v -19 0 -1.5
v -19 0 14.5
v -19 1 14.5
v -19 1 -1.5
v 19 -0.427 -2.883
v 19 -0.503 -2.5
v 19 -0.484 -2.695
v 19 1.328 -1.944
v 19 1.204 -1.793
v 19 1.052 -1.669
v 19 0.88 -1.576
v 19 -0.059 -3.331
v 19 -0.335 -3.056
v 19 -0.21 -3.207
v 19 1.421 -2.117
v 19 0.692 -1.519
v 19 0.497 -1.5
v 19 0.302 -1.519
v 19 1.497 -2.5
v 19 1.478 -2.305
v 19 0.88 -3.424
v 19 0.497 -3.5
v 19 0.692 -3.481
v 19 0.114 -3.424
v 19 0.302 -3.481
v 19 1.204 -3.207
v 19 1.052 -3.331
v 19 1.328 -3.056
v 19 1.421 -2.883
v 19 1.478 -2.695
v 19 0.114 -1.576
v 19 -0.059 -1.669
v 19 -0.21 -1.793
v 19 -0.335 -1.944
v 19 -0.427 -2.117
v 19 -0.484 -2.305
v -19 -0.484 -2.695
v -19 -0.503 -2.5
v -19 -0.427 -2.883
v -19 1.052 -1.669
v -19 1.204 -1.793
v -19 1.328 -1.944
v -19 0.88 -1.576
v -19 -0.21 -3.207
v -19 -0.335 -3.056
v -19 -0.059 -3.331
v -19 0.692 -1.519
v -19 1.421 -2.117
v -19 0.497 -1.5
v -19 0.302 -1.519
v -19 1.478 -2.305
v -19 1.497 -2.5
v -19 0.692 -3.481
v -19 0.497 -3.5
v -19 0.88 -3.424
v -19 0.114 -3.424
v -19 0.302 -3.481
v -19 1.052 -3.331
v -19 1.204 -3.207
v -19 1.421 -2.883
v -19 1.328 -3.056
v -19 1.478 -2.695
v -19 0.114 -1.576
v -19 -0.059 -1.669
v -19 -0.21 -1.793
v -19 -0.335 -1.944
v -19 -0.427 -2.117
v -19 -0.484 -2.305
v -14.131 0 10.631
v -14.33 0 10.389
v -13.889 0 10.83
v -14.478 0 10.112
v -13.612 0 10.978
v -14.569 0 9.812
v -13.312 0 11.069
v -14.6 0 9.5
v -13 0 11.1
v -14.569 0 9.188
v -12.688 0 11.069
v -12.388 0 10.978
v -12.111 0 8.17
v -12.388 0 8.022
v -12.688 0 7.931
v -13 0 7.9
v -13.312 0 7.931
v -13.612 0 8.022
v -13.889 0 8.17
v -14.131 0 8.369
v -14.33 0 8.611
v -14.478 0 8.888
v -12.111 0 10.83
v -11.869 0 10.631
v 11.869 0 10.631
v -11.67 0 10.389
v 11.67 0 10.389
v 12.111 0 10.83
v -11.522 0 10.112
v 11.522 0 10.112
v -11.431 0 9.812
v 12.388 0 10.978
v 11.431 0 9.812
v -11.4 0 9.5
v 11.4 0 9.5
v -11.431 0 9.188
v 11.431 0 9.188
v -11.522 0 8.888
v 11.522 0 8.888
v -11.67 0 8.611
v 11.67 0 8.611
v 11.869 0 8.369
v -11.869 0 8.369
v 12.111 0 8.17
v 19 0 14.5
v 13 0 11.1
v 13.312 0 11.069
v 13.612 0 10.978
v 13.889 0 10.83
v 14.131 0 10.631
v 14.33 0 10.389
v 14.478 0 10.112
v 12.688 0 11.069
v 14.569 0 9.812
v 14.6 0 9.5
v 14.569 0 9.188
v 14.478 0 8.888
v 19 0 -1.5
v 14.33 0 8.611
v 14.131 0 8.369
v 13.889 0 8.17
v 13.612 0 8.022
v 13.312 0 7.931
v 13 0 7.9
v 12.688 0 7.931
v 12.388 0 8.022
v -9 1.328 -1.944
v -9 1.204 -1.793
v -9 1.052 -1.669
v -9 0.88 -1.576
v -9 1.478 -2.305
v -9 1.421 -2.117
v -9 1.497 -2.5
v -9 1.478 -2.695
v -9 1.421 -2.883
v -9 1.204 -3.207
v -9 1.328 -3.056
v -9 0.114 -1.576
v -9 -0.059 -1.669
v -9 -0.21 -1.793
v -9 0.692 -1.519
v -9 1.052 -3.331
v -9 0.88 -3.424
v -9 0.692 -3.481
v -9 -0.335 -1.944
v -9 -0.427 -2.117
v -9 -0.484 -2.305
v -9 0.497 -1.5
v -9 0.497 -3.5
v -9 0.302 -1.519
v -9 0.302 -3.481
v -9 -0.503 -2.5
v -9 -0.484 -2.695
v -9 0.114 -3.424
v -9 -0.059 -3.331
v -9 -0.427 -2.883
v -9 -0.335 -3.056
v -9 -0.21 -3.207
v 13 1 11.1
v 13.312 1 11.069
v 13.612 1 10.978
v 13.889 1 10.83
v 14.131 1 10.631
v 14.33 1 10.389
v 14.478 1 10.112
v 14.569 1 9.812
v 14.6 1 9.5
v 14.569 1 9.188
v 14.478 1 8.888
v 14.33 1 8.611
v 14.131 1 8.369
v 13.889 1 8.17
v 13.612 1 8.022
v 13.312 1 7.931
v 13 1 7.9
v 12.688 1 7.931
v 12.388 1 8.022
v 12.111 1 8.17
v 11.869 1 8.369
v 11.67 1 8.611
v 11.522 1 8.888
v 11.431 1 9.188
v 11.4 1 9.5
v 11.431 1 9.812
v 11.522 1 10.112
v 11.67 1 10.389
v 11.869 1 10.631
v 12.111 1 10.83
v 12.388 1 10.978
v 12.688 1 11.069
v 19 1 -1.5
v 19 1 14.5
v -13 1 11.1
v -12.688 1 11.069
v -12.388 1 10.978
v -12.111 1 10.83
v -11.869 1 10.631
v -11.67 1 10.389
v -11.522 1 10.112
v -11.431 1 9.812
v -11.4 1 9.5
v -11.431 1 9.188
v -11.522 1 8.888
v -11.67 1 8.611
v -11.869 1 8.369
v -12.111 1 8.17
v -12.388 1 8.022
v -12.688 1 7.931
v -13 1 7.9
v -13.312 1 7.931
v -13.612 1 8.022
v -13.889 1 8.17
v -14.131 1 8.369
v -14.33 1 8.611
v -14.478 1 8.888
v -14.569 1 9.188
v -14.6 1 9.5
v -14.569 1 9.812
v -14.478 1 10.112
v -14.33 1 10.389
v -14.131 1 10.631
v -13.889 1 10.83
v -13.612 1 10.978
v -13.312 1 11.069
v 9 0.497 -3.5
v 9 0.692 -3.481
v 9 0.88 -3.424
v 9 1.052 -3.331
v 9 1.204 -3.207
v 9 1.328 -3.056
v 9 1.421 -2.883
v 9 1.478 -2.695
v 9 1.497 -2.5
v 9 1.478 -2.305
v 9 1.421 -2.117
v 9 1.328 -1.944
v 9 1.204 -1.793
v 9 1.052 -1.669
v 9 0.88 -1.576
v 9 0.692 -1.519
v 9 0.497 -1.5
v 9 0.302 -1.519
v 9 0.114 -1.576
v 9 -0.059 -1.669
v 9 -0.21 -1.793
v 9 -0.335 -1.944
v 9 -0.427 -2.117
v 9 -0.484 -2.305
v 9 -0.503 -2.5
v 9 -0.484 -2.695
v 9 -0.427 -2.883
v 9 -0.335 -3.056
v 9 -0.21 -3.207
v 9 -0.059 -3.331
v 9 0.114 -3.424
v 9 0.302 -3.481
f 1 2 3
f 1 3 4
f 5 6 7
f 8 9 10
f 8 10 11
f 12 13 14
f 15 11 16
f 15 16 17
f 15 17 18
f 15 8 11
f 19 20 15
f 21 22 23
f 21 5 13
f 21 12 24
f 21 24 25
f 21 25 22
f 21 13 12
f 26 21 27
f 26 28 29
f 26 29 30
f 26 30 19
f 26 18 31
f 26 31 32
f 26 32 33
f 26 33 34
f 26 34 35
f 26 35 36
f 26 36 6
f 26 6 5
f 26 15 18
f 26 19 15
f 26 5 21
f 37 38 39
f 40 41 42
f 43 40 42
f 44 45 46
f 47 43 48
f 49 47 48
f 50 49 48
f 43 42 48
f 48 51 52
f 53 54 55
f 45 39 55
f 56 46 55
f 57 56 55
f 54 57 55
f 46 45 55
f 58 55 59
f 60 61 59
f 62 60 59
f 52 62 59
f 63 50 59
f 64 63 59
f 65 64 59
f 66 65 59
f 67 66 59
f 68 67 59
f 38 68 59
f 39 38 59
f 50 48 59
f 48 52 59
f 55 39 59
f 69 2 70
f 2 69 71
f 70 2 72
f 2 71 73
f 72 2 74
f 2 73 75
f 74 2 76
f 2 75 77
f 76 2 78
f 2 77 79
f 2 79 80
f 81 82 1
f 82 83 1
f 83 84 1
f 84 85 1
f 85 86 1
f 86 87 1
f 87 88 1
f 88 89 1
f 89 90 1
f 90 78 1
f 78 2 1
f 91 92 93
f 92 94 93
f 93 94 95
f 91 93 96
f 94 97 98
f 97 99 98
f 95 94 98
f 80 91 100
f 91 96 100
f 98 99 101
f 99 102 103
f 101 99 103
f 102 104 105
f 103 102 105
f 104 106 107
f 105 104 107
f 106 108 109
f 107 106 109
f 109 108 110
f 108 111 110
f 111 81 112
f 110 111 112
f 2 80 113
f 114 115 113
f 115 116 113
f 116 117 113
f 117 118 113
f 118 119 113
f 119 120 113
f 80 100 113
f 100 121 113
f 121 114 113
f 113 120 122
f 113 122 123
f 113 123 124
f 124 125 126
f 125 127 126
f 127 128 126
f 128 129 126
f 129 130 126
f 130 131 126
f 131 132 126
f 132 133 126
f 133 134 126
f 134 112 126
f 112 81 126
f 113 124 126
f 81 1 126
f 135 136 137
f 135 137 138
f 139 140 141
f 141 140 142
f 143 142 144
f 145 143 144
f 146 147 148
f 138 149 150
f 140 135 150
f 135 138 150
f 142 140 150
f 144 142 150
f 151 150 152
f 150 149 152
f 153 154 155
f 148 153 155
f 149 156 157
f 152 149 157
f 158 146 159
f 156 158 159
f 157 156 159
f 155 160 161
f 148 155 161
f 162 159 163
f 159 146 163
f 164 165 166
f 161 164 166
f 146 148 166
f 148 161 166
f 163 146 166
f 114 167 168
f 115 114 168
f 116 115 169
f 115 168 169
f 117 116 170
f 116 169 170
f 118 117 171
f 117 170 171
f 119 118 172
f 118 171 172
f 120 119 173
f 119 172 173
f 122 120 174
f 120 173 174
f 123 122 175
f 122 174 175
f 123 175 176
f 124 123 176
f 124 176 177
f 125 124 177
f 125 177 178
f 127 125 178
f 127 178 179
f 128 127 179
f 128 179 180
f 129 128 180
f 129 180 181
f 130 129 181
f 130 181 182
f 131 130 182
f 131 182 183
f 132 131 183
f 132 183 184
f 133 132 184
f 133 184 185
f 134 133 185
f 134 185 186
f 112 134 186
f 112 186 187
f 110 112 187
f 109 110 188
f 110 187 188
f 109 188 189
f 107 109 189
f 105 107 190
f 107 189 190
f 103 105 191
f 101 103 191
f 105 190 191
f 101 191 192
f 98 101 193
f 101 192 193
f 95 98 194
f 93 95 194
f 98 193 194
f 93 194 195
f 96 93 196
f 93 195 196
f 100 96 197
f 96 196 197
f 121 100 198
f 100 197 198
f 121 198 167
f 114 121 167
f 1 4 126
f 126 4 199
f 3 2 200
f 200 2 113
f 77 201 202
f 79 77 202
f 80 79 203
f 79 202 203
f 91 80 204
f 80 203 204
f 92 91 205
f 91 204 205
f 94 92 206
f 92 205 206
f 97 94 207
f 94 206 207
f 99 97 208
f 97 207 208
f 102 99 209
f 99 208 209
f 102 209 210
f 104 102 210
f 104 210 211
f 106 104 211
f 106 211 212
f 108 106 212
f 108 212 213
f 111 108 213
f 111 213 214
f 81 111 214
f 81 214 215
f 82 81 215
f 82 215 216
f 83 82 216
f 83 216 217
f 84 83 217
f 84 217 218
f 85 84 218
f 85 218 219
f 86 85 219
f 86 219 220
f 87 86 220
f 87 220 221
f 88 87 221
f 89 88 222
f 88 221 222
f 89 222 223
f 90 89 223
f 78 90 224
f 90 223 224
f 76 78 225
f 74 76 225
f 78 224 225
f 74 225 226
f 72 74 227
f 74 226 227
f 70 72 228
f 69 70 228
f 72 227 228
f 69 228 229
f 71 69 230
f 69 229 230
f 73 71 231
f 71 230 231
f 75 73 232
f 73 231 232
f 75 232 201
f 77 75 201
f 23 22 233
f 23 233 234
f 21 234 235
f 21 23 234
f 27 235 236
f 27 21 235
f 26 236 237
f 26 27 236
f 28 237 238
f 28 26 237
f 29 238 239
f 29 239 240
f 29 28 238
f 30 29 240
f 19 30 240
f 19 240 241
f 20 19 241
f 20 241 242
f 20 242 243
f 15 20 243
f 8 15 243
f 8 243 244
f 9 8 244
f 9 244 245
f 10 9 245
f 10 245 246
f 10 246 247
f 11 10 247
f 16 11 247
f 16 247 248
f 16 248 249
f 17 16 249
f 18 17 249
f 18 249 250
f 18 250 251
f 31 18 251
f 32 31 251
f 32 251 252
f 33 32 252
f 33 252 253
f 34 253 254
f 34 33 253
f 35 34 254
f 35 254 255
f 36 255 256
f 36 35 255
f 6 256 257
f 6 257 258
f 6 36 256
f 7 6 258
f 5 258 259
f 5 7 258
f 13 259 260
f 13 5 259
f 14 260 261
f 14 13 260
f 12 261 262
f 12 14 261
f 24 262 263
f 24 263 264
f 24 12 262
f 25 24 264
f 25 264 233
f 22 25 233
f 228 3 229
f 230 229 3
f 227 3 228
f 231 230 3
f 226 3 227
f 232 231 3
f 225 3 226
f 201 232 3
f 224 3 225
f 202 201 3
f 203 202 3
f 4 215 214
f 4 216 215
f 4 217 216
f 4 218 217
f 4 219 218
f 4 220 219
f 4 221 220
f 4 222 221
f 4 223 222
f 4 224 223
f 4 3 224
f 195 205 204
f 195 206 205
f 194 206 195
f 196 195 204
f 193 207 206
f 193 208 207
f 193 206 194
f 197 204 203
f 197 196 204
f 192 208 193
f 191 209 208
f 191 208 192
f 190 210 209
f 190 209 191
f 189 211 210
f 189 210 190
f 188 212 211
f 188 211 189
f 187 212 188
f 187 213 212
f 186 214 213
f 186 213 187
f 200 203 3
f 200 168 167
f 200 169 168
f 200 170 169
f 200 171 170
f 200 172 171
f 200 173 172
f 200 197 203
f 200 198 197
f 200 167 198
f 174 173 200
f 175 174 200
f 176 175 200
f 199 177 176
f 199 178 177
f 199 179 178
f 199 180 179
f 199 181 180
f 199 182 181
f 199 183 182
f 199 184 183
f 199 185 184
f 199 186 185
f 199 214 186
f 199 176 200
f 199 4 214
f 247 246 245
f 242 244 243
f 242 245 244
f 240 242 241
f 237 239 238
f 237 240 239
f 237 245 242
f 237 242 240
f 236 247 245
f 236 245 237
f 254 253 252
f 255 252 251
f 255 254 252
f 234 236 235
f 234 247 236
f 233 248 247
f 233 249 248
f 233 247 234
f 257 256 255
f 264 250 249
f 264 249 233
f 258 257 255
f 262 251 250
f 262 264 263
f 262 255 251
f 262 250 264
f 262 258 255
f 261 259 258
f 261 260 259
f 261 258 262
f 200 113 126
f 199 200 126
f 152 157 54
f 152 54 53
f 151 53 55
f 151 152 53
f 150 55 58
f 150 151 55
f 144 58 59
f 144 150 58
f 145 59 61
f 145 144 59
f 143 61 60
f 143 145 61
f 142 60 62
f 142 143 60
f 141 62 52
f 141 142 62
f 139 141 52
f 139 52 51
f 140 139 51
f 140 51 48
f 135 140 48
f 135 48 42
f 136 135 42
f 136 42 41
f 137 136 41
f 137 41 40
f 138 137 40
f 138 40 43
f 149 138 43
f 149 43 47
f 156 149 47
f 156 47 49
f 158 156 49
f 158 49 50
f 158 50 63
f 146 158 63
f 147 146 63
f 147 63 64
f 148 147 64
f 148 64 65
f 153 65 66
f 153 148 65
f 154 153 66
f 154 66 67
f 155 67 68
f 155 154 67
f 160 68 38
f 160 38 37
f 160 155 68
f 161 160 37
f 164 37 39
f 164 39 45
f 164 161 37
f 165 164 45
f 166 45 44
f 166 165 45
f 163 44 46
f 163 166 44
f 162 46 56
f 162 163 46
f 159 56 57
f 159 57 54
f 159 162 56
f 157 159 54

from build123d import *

# Parameters (mm, degrees)
SKETCH_1_W               = 38
SKETCH_1_H               = 29
EXTRUDE_1_DEPTH          = 1
CUT_EXTRUDE_1_REACH      = 25.922
SKETCH_2_R               = 1.6
SKETCH_2_R_2             = 1.38449668
SKETCH_3_W               = 38
SKETCH_3_H               = 13
CUT_EXTRUDE_2_DEPTH      = 8
SKETCH_5_R               = 1
EXTRUDE_2_DEPTH          = 38
CUT_EXTRUDE_3_DEPTH      = 24.948056448
CUT_EXTRUDE_3_DEPTH_BACK = 24.948056448
SKETCH_6_W               = 18
SKETCH_6_H               = 3.858849935


with BuildPart() as part:
    # 草图1 → 凸台-拉伸1 (new body)
    with BuildSketch(Plane(origin=(0, 0, 0), x_dir=(1, 0, 0), z_dir=(0, 1, 0))):
        Rectangle(SKETCH_1_W, SKETCH_1_H)
    extrude(amount=EXTRUDE_1_DEPTH)

    # 草图2 → 切除-拉伸1 (cut, up to next)
    with BuildSketch(Plane(origin=(0, 1, 0), x_dir=(1, 0, 0), z_dir=(0, 1, 0)), mode=Mode.PRIVATE) as cut_extrude_1_sk1:
        with Locations(Location((13, -9.5, 0), (0, 0, 270))):
            Circle(SKETCH_2_R)
    cut_extrude_1_tool1 = extrude(cut_extrude_1_sk1.sketch, amount=-CUT_EXTRUDE_1_REACH, mode=Mode.PRIVATE) & part.part
    # 草图2 → 切除-拉伸1 (cut, up to next)
    with BuildSketch(Plane(origin=(0, 1, 0), x_dir=(1, 0, 0), z_dir=(0, 1, 0)), mode=Mode.PRIVATE) as cut_extrude_1_sk2:
        with Locations(Location((13, 9.5, 0), (0, 0, 270))):
            Circle(SKETCH_2_R_2)
    cut_extrude_1_tool2 = extrude(cut_extrude_1_sk2.sketch, amount=-CUT_EXTRUDE_1_REACH, mode=Mode.PRIVATE) & part.part
    # 草图2 → 切除-拉伸1 (cut, up to next)
    with BuildSketch(Plane(origin=(0, 1, 0), x_dir=(1, 0, 0), z_dir=(0, 1, 0)), mode=Mode.PRIVATE) as cut_extrude_1_sk3:
        with Locations(Location((-13, 9.5, 0), (0, 0, 270))):
            Circle(SKETCH_2_R_2)
    cut_extrude_1_tool3 = extrude(cut_extrude_1_sk3.sketch, amount=-CUT_EXTRUDE_1_REACH, mode=Mode.PRIVATE) & part.part
    # 草图2 → 切除-拉伸1 (cut, up to next)
    with BuildSketch(Plane(origin=(0, 1, 0), x_dir=(1, 0, 0), z_dir=(0, 1, 0)), mode=Mode.PRIVATE) as cut_extrude_1_sk4:
        with Locations(Location((-13, -9.5, 0), (0, 0, 270))):
            Circle(SKETCH_2_R)
    cut_extrude_1_tool4 = extrude(cut_extrude_1_sk4.sketch, amount=-CUT_EXTRUDE_1_REACH, mode=Mode.PRIVATE) & part.part
    add(cut_extrude_1_tool1.solids().sort_by_distance((13, 1, 9.5))[0], mode=Mode.SUBTRACT)
    add(cut_extrude_1_tool2.solids().sort_by_distance((13, 1, -9.5))[0], mode=Mode.SUBTRACT)
    add(cut_extrude_1_tool3.solids().sort_by_distance((-13, 1, -9.5))[0], mode=Mode.SUBTRACT)
    add(cut_extrude_1_tool4.solids().sort_by_distance((-13, 1, 9.5))[0], mode=Mode.SUBTRACT)

    # 草图3 → 切除-拉伸2 (cut)
    with BuildSketch(Plane(origin=(0, 1, 0), x_dir=(1, 0, 0), z_dir=(0, 1, 0))):
        with Locations((0, 8)):
            Rectangle(SKETCH_3_W, SKETCH_3_H)
    extrude(amount=-CUT_EXTRUDE_2_DEPTH, mode=Mode.SUBTRACT)


with BuildPart() as body_2:
    # 草图5 → 凸台-拉伸2 (new body)
    with BuildSketch(Plane(origin=(19, 0, 0), x_dir=(0, 0, -1), z_dir=(1, 0, 0))):
        with Locations((2.5, 0.496867392)):
            Circle(SKETCH_5_R)
    extrude(amount=-EXTRUDE_2_DEPTH)

    # 草图6 → 切除-拉伸3 (cut, two sides: drawn at the far end of the back side and taken through both)
    with BuildSketch(Plane(origin=(0, 1, 0), x_dir=(1, 0, 0), z_dir=(0, 1, 0)).offset(-CUT_EXTRUDE_3_DEPTH_BACK)):
        with Locations((0, 3.429424968)):
            Rectangle(SKETCH_6_W, SKETCH_6_H)
    extrude(amount=CUT_EXTRUDE_3_DEPTH + CUT_EXTRUDE_3_DEPTH_BACK, mode=Mode.SUBTRACT)


with BuildPart() as cut_extrude_3_piece_1:
    # of the separate pieces the step leaves, piece 1, a body of its own (cut_extrude_3_pieces)
    add(body_2.part.solids().sort_by_distance((-9, 0.496867392, -3.5))[0])


with BuildPart() as cut_extrude_3_piece_2:
    # of the separate pieces the step leaves, piece 2, a body of its own (cut_extrude_3_pieces)
    add(body_2.part.solids().sort_by_distance((19, 0.496867392, -3.5))[0])


solid = Compound([part.part, cut_extrude_3_piece_1.part, cut_extrude_3_piece_2.part])
